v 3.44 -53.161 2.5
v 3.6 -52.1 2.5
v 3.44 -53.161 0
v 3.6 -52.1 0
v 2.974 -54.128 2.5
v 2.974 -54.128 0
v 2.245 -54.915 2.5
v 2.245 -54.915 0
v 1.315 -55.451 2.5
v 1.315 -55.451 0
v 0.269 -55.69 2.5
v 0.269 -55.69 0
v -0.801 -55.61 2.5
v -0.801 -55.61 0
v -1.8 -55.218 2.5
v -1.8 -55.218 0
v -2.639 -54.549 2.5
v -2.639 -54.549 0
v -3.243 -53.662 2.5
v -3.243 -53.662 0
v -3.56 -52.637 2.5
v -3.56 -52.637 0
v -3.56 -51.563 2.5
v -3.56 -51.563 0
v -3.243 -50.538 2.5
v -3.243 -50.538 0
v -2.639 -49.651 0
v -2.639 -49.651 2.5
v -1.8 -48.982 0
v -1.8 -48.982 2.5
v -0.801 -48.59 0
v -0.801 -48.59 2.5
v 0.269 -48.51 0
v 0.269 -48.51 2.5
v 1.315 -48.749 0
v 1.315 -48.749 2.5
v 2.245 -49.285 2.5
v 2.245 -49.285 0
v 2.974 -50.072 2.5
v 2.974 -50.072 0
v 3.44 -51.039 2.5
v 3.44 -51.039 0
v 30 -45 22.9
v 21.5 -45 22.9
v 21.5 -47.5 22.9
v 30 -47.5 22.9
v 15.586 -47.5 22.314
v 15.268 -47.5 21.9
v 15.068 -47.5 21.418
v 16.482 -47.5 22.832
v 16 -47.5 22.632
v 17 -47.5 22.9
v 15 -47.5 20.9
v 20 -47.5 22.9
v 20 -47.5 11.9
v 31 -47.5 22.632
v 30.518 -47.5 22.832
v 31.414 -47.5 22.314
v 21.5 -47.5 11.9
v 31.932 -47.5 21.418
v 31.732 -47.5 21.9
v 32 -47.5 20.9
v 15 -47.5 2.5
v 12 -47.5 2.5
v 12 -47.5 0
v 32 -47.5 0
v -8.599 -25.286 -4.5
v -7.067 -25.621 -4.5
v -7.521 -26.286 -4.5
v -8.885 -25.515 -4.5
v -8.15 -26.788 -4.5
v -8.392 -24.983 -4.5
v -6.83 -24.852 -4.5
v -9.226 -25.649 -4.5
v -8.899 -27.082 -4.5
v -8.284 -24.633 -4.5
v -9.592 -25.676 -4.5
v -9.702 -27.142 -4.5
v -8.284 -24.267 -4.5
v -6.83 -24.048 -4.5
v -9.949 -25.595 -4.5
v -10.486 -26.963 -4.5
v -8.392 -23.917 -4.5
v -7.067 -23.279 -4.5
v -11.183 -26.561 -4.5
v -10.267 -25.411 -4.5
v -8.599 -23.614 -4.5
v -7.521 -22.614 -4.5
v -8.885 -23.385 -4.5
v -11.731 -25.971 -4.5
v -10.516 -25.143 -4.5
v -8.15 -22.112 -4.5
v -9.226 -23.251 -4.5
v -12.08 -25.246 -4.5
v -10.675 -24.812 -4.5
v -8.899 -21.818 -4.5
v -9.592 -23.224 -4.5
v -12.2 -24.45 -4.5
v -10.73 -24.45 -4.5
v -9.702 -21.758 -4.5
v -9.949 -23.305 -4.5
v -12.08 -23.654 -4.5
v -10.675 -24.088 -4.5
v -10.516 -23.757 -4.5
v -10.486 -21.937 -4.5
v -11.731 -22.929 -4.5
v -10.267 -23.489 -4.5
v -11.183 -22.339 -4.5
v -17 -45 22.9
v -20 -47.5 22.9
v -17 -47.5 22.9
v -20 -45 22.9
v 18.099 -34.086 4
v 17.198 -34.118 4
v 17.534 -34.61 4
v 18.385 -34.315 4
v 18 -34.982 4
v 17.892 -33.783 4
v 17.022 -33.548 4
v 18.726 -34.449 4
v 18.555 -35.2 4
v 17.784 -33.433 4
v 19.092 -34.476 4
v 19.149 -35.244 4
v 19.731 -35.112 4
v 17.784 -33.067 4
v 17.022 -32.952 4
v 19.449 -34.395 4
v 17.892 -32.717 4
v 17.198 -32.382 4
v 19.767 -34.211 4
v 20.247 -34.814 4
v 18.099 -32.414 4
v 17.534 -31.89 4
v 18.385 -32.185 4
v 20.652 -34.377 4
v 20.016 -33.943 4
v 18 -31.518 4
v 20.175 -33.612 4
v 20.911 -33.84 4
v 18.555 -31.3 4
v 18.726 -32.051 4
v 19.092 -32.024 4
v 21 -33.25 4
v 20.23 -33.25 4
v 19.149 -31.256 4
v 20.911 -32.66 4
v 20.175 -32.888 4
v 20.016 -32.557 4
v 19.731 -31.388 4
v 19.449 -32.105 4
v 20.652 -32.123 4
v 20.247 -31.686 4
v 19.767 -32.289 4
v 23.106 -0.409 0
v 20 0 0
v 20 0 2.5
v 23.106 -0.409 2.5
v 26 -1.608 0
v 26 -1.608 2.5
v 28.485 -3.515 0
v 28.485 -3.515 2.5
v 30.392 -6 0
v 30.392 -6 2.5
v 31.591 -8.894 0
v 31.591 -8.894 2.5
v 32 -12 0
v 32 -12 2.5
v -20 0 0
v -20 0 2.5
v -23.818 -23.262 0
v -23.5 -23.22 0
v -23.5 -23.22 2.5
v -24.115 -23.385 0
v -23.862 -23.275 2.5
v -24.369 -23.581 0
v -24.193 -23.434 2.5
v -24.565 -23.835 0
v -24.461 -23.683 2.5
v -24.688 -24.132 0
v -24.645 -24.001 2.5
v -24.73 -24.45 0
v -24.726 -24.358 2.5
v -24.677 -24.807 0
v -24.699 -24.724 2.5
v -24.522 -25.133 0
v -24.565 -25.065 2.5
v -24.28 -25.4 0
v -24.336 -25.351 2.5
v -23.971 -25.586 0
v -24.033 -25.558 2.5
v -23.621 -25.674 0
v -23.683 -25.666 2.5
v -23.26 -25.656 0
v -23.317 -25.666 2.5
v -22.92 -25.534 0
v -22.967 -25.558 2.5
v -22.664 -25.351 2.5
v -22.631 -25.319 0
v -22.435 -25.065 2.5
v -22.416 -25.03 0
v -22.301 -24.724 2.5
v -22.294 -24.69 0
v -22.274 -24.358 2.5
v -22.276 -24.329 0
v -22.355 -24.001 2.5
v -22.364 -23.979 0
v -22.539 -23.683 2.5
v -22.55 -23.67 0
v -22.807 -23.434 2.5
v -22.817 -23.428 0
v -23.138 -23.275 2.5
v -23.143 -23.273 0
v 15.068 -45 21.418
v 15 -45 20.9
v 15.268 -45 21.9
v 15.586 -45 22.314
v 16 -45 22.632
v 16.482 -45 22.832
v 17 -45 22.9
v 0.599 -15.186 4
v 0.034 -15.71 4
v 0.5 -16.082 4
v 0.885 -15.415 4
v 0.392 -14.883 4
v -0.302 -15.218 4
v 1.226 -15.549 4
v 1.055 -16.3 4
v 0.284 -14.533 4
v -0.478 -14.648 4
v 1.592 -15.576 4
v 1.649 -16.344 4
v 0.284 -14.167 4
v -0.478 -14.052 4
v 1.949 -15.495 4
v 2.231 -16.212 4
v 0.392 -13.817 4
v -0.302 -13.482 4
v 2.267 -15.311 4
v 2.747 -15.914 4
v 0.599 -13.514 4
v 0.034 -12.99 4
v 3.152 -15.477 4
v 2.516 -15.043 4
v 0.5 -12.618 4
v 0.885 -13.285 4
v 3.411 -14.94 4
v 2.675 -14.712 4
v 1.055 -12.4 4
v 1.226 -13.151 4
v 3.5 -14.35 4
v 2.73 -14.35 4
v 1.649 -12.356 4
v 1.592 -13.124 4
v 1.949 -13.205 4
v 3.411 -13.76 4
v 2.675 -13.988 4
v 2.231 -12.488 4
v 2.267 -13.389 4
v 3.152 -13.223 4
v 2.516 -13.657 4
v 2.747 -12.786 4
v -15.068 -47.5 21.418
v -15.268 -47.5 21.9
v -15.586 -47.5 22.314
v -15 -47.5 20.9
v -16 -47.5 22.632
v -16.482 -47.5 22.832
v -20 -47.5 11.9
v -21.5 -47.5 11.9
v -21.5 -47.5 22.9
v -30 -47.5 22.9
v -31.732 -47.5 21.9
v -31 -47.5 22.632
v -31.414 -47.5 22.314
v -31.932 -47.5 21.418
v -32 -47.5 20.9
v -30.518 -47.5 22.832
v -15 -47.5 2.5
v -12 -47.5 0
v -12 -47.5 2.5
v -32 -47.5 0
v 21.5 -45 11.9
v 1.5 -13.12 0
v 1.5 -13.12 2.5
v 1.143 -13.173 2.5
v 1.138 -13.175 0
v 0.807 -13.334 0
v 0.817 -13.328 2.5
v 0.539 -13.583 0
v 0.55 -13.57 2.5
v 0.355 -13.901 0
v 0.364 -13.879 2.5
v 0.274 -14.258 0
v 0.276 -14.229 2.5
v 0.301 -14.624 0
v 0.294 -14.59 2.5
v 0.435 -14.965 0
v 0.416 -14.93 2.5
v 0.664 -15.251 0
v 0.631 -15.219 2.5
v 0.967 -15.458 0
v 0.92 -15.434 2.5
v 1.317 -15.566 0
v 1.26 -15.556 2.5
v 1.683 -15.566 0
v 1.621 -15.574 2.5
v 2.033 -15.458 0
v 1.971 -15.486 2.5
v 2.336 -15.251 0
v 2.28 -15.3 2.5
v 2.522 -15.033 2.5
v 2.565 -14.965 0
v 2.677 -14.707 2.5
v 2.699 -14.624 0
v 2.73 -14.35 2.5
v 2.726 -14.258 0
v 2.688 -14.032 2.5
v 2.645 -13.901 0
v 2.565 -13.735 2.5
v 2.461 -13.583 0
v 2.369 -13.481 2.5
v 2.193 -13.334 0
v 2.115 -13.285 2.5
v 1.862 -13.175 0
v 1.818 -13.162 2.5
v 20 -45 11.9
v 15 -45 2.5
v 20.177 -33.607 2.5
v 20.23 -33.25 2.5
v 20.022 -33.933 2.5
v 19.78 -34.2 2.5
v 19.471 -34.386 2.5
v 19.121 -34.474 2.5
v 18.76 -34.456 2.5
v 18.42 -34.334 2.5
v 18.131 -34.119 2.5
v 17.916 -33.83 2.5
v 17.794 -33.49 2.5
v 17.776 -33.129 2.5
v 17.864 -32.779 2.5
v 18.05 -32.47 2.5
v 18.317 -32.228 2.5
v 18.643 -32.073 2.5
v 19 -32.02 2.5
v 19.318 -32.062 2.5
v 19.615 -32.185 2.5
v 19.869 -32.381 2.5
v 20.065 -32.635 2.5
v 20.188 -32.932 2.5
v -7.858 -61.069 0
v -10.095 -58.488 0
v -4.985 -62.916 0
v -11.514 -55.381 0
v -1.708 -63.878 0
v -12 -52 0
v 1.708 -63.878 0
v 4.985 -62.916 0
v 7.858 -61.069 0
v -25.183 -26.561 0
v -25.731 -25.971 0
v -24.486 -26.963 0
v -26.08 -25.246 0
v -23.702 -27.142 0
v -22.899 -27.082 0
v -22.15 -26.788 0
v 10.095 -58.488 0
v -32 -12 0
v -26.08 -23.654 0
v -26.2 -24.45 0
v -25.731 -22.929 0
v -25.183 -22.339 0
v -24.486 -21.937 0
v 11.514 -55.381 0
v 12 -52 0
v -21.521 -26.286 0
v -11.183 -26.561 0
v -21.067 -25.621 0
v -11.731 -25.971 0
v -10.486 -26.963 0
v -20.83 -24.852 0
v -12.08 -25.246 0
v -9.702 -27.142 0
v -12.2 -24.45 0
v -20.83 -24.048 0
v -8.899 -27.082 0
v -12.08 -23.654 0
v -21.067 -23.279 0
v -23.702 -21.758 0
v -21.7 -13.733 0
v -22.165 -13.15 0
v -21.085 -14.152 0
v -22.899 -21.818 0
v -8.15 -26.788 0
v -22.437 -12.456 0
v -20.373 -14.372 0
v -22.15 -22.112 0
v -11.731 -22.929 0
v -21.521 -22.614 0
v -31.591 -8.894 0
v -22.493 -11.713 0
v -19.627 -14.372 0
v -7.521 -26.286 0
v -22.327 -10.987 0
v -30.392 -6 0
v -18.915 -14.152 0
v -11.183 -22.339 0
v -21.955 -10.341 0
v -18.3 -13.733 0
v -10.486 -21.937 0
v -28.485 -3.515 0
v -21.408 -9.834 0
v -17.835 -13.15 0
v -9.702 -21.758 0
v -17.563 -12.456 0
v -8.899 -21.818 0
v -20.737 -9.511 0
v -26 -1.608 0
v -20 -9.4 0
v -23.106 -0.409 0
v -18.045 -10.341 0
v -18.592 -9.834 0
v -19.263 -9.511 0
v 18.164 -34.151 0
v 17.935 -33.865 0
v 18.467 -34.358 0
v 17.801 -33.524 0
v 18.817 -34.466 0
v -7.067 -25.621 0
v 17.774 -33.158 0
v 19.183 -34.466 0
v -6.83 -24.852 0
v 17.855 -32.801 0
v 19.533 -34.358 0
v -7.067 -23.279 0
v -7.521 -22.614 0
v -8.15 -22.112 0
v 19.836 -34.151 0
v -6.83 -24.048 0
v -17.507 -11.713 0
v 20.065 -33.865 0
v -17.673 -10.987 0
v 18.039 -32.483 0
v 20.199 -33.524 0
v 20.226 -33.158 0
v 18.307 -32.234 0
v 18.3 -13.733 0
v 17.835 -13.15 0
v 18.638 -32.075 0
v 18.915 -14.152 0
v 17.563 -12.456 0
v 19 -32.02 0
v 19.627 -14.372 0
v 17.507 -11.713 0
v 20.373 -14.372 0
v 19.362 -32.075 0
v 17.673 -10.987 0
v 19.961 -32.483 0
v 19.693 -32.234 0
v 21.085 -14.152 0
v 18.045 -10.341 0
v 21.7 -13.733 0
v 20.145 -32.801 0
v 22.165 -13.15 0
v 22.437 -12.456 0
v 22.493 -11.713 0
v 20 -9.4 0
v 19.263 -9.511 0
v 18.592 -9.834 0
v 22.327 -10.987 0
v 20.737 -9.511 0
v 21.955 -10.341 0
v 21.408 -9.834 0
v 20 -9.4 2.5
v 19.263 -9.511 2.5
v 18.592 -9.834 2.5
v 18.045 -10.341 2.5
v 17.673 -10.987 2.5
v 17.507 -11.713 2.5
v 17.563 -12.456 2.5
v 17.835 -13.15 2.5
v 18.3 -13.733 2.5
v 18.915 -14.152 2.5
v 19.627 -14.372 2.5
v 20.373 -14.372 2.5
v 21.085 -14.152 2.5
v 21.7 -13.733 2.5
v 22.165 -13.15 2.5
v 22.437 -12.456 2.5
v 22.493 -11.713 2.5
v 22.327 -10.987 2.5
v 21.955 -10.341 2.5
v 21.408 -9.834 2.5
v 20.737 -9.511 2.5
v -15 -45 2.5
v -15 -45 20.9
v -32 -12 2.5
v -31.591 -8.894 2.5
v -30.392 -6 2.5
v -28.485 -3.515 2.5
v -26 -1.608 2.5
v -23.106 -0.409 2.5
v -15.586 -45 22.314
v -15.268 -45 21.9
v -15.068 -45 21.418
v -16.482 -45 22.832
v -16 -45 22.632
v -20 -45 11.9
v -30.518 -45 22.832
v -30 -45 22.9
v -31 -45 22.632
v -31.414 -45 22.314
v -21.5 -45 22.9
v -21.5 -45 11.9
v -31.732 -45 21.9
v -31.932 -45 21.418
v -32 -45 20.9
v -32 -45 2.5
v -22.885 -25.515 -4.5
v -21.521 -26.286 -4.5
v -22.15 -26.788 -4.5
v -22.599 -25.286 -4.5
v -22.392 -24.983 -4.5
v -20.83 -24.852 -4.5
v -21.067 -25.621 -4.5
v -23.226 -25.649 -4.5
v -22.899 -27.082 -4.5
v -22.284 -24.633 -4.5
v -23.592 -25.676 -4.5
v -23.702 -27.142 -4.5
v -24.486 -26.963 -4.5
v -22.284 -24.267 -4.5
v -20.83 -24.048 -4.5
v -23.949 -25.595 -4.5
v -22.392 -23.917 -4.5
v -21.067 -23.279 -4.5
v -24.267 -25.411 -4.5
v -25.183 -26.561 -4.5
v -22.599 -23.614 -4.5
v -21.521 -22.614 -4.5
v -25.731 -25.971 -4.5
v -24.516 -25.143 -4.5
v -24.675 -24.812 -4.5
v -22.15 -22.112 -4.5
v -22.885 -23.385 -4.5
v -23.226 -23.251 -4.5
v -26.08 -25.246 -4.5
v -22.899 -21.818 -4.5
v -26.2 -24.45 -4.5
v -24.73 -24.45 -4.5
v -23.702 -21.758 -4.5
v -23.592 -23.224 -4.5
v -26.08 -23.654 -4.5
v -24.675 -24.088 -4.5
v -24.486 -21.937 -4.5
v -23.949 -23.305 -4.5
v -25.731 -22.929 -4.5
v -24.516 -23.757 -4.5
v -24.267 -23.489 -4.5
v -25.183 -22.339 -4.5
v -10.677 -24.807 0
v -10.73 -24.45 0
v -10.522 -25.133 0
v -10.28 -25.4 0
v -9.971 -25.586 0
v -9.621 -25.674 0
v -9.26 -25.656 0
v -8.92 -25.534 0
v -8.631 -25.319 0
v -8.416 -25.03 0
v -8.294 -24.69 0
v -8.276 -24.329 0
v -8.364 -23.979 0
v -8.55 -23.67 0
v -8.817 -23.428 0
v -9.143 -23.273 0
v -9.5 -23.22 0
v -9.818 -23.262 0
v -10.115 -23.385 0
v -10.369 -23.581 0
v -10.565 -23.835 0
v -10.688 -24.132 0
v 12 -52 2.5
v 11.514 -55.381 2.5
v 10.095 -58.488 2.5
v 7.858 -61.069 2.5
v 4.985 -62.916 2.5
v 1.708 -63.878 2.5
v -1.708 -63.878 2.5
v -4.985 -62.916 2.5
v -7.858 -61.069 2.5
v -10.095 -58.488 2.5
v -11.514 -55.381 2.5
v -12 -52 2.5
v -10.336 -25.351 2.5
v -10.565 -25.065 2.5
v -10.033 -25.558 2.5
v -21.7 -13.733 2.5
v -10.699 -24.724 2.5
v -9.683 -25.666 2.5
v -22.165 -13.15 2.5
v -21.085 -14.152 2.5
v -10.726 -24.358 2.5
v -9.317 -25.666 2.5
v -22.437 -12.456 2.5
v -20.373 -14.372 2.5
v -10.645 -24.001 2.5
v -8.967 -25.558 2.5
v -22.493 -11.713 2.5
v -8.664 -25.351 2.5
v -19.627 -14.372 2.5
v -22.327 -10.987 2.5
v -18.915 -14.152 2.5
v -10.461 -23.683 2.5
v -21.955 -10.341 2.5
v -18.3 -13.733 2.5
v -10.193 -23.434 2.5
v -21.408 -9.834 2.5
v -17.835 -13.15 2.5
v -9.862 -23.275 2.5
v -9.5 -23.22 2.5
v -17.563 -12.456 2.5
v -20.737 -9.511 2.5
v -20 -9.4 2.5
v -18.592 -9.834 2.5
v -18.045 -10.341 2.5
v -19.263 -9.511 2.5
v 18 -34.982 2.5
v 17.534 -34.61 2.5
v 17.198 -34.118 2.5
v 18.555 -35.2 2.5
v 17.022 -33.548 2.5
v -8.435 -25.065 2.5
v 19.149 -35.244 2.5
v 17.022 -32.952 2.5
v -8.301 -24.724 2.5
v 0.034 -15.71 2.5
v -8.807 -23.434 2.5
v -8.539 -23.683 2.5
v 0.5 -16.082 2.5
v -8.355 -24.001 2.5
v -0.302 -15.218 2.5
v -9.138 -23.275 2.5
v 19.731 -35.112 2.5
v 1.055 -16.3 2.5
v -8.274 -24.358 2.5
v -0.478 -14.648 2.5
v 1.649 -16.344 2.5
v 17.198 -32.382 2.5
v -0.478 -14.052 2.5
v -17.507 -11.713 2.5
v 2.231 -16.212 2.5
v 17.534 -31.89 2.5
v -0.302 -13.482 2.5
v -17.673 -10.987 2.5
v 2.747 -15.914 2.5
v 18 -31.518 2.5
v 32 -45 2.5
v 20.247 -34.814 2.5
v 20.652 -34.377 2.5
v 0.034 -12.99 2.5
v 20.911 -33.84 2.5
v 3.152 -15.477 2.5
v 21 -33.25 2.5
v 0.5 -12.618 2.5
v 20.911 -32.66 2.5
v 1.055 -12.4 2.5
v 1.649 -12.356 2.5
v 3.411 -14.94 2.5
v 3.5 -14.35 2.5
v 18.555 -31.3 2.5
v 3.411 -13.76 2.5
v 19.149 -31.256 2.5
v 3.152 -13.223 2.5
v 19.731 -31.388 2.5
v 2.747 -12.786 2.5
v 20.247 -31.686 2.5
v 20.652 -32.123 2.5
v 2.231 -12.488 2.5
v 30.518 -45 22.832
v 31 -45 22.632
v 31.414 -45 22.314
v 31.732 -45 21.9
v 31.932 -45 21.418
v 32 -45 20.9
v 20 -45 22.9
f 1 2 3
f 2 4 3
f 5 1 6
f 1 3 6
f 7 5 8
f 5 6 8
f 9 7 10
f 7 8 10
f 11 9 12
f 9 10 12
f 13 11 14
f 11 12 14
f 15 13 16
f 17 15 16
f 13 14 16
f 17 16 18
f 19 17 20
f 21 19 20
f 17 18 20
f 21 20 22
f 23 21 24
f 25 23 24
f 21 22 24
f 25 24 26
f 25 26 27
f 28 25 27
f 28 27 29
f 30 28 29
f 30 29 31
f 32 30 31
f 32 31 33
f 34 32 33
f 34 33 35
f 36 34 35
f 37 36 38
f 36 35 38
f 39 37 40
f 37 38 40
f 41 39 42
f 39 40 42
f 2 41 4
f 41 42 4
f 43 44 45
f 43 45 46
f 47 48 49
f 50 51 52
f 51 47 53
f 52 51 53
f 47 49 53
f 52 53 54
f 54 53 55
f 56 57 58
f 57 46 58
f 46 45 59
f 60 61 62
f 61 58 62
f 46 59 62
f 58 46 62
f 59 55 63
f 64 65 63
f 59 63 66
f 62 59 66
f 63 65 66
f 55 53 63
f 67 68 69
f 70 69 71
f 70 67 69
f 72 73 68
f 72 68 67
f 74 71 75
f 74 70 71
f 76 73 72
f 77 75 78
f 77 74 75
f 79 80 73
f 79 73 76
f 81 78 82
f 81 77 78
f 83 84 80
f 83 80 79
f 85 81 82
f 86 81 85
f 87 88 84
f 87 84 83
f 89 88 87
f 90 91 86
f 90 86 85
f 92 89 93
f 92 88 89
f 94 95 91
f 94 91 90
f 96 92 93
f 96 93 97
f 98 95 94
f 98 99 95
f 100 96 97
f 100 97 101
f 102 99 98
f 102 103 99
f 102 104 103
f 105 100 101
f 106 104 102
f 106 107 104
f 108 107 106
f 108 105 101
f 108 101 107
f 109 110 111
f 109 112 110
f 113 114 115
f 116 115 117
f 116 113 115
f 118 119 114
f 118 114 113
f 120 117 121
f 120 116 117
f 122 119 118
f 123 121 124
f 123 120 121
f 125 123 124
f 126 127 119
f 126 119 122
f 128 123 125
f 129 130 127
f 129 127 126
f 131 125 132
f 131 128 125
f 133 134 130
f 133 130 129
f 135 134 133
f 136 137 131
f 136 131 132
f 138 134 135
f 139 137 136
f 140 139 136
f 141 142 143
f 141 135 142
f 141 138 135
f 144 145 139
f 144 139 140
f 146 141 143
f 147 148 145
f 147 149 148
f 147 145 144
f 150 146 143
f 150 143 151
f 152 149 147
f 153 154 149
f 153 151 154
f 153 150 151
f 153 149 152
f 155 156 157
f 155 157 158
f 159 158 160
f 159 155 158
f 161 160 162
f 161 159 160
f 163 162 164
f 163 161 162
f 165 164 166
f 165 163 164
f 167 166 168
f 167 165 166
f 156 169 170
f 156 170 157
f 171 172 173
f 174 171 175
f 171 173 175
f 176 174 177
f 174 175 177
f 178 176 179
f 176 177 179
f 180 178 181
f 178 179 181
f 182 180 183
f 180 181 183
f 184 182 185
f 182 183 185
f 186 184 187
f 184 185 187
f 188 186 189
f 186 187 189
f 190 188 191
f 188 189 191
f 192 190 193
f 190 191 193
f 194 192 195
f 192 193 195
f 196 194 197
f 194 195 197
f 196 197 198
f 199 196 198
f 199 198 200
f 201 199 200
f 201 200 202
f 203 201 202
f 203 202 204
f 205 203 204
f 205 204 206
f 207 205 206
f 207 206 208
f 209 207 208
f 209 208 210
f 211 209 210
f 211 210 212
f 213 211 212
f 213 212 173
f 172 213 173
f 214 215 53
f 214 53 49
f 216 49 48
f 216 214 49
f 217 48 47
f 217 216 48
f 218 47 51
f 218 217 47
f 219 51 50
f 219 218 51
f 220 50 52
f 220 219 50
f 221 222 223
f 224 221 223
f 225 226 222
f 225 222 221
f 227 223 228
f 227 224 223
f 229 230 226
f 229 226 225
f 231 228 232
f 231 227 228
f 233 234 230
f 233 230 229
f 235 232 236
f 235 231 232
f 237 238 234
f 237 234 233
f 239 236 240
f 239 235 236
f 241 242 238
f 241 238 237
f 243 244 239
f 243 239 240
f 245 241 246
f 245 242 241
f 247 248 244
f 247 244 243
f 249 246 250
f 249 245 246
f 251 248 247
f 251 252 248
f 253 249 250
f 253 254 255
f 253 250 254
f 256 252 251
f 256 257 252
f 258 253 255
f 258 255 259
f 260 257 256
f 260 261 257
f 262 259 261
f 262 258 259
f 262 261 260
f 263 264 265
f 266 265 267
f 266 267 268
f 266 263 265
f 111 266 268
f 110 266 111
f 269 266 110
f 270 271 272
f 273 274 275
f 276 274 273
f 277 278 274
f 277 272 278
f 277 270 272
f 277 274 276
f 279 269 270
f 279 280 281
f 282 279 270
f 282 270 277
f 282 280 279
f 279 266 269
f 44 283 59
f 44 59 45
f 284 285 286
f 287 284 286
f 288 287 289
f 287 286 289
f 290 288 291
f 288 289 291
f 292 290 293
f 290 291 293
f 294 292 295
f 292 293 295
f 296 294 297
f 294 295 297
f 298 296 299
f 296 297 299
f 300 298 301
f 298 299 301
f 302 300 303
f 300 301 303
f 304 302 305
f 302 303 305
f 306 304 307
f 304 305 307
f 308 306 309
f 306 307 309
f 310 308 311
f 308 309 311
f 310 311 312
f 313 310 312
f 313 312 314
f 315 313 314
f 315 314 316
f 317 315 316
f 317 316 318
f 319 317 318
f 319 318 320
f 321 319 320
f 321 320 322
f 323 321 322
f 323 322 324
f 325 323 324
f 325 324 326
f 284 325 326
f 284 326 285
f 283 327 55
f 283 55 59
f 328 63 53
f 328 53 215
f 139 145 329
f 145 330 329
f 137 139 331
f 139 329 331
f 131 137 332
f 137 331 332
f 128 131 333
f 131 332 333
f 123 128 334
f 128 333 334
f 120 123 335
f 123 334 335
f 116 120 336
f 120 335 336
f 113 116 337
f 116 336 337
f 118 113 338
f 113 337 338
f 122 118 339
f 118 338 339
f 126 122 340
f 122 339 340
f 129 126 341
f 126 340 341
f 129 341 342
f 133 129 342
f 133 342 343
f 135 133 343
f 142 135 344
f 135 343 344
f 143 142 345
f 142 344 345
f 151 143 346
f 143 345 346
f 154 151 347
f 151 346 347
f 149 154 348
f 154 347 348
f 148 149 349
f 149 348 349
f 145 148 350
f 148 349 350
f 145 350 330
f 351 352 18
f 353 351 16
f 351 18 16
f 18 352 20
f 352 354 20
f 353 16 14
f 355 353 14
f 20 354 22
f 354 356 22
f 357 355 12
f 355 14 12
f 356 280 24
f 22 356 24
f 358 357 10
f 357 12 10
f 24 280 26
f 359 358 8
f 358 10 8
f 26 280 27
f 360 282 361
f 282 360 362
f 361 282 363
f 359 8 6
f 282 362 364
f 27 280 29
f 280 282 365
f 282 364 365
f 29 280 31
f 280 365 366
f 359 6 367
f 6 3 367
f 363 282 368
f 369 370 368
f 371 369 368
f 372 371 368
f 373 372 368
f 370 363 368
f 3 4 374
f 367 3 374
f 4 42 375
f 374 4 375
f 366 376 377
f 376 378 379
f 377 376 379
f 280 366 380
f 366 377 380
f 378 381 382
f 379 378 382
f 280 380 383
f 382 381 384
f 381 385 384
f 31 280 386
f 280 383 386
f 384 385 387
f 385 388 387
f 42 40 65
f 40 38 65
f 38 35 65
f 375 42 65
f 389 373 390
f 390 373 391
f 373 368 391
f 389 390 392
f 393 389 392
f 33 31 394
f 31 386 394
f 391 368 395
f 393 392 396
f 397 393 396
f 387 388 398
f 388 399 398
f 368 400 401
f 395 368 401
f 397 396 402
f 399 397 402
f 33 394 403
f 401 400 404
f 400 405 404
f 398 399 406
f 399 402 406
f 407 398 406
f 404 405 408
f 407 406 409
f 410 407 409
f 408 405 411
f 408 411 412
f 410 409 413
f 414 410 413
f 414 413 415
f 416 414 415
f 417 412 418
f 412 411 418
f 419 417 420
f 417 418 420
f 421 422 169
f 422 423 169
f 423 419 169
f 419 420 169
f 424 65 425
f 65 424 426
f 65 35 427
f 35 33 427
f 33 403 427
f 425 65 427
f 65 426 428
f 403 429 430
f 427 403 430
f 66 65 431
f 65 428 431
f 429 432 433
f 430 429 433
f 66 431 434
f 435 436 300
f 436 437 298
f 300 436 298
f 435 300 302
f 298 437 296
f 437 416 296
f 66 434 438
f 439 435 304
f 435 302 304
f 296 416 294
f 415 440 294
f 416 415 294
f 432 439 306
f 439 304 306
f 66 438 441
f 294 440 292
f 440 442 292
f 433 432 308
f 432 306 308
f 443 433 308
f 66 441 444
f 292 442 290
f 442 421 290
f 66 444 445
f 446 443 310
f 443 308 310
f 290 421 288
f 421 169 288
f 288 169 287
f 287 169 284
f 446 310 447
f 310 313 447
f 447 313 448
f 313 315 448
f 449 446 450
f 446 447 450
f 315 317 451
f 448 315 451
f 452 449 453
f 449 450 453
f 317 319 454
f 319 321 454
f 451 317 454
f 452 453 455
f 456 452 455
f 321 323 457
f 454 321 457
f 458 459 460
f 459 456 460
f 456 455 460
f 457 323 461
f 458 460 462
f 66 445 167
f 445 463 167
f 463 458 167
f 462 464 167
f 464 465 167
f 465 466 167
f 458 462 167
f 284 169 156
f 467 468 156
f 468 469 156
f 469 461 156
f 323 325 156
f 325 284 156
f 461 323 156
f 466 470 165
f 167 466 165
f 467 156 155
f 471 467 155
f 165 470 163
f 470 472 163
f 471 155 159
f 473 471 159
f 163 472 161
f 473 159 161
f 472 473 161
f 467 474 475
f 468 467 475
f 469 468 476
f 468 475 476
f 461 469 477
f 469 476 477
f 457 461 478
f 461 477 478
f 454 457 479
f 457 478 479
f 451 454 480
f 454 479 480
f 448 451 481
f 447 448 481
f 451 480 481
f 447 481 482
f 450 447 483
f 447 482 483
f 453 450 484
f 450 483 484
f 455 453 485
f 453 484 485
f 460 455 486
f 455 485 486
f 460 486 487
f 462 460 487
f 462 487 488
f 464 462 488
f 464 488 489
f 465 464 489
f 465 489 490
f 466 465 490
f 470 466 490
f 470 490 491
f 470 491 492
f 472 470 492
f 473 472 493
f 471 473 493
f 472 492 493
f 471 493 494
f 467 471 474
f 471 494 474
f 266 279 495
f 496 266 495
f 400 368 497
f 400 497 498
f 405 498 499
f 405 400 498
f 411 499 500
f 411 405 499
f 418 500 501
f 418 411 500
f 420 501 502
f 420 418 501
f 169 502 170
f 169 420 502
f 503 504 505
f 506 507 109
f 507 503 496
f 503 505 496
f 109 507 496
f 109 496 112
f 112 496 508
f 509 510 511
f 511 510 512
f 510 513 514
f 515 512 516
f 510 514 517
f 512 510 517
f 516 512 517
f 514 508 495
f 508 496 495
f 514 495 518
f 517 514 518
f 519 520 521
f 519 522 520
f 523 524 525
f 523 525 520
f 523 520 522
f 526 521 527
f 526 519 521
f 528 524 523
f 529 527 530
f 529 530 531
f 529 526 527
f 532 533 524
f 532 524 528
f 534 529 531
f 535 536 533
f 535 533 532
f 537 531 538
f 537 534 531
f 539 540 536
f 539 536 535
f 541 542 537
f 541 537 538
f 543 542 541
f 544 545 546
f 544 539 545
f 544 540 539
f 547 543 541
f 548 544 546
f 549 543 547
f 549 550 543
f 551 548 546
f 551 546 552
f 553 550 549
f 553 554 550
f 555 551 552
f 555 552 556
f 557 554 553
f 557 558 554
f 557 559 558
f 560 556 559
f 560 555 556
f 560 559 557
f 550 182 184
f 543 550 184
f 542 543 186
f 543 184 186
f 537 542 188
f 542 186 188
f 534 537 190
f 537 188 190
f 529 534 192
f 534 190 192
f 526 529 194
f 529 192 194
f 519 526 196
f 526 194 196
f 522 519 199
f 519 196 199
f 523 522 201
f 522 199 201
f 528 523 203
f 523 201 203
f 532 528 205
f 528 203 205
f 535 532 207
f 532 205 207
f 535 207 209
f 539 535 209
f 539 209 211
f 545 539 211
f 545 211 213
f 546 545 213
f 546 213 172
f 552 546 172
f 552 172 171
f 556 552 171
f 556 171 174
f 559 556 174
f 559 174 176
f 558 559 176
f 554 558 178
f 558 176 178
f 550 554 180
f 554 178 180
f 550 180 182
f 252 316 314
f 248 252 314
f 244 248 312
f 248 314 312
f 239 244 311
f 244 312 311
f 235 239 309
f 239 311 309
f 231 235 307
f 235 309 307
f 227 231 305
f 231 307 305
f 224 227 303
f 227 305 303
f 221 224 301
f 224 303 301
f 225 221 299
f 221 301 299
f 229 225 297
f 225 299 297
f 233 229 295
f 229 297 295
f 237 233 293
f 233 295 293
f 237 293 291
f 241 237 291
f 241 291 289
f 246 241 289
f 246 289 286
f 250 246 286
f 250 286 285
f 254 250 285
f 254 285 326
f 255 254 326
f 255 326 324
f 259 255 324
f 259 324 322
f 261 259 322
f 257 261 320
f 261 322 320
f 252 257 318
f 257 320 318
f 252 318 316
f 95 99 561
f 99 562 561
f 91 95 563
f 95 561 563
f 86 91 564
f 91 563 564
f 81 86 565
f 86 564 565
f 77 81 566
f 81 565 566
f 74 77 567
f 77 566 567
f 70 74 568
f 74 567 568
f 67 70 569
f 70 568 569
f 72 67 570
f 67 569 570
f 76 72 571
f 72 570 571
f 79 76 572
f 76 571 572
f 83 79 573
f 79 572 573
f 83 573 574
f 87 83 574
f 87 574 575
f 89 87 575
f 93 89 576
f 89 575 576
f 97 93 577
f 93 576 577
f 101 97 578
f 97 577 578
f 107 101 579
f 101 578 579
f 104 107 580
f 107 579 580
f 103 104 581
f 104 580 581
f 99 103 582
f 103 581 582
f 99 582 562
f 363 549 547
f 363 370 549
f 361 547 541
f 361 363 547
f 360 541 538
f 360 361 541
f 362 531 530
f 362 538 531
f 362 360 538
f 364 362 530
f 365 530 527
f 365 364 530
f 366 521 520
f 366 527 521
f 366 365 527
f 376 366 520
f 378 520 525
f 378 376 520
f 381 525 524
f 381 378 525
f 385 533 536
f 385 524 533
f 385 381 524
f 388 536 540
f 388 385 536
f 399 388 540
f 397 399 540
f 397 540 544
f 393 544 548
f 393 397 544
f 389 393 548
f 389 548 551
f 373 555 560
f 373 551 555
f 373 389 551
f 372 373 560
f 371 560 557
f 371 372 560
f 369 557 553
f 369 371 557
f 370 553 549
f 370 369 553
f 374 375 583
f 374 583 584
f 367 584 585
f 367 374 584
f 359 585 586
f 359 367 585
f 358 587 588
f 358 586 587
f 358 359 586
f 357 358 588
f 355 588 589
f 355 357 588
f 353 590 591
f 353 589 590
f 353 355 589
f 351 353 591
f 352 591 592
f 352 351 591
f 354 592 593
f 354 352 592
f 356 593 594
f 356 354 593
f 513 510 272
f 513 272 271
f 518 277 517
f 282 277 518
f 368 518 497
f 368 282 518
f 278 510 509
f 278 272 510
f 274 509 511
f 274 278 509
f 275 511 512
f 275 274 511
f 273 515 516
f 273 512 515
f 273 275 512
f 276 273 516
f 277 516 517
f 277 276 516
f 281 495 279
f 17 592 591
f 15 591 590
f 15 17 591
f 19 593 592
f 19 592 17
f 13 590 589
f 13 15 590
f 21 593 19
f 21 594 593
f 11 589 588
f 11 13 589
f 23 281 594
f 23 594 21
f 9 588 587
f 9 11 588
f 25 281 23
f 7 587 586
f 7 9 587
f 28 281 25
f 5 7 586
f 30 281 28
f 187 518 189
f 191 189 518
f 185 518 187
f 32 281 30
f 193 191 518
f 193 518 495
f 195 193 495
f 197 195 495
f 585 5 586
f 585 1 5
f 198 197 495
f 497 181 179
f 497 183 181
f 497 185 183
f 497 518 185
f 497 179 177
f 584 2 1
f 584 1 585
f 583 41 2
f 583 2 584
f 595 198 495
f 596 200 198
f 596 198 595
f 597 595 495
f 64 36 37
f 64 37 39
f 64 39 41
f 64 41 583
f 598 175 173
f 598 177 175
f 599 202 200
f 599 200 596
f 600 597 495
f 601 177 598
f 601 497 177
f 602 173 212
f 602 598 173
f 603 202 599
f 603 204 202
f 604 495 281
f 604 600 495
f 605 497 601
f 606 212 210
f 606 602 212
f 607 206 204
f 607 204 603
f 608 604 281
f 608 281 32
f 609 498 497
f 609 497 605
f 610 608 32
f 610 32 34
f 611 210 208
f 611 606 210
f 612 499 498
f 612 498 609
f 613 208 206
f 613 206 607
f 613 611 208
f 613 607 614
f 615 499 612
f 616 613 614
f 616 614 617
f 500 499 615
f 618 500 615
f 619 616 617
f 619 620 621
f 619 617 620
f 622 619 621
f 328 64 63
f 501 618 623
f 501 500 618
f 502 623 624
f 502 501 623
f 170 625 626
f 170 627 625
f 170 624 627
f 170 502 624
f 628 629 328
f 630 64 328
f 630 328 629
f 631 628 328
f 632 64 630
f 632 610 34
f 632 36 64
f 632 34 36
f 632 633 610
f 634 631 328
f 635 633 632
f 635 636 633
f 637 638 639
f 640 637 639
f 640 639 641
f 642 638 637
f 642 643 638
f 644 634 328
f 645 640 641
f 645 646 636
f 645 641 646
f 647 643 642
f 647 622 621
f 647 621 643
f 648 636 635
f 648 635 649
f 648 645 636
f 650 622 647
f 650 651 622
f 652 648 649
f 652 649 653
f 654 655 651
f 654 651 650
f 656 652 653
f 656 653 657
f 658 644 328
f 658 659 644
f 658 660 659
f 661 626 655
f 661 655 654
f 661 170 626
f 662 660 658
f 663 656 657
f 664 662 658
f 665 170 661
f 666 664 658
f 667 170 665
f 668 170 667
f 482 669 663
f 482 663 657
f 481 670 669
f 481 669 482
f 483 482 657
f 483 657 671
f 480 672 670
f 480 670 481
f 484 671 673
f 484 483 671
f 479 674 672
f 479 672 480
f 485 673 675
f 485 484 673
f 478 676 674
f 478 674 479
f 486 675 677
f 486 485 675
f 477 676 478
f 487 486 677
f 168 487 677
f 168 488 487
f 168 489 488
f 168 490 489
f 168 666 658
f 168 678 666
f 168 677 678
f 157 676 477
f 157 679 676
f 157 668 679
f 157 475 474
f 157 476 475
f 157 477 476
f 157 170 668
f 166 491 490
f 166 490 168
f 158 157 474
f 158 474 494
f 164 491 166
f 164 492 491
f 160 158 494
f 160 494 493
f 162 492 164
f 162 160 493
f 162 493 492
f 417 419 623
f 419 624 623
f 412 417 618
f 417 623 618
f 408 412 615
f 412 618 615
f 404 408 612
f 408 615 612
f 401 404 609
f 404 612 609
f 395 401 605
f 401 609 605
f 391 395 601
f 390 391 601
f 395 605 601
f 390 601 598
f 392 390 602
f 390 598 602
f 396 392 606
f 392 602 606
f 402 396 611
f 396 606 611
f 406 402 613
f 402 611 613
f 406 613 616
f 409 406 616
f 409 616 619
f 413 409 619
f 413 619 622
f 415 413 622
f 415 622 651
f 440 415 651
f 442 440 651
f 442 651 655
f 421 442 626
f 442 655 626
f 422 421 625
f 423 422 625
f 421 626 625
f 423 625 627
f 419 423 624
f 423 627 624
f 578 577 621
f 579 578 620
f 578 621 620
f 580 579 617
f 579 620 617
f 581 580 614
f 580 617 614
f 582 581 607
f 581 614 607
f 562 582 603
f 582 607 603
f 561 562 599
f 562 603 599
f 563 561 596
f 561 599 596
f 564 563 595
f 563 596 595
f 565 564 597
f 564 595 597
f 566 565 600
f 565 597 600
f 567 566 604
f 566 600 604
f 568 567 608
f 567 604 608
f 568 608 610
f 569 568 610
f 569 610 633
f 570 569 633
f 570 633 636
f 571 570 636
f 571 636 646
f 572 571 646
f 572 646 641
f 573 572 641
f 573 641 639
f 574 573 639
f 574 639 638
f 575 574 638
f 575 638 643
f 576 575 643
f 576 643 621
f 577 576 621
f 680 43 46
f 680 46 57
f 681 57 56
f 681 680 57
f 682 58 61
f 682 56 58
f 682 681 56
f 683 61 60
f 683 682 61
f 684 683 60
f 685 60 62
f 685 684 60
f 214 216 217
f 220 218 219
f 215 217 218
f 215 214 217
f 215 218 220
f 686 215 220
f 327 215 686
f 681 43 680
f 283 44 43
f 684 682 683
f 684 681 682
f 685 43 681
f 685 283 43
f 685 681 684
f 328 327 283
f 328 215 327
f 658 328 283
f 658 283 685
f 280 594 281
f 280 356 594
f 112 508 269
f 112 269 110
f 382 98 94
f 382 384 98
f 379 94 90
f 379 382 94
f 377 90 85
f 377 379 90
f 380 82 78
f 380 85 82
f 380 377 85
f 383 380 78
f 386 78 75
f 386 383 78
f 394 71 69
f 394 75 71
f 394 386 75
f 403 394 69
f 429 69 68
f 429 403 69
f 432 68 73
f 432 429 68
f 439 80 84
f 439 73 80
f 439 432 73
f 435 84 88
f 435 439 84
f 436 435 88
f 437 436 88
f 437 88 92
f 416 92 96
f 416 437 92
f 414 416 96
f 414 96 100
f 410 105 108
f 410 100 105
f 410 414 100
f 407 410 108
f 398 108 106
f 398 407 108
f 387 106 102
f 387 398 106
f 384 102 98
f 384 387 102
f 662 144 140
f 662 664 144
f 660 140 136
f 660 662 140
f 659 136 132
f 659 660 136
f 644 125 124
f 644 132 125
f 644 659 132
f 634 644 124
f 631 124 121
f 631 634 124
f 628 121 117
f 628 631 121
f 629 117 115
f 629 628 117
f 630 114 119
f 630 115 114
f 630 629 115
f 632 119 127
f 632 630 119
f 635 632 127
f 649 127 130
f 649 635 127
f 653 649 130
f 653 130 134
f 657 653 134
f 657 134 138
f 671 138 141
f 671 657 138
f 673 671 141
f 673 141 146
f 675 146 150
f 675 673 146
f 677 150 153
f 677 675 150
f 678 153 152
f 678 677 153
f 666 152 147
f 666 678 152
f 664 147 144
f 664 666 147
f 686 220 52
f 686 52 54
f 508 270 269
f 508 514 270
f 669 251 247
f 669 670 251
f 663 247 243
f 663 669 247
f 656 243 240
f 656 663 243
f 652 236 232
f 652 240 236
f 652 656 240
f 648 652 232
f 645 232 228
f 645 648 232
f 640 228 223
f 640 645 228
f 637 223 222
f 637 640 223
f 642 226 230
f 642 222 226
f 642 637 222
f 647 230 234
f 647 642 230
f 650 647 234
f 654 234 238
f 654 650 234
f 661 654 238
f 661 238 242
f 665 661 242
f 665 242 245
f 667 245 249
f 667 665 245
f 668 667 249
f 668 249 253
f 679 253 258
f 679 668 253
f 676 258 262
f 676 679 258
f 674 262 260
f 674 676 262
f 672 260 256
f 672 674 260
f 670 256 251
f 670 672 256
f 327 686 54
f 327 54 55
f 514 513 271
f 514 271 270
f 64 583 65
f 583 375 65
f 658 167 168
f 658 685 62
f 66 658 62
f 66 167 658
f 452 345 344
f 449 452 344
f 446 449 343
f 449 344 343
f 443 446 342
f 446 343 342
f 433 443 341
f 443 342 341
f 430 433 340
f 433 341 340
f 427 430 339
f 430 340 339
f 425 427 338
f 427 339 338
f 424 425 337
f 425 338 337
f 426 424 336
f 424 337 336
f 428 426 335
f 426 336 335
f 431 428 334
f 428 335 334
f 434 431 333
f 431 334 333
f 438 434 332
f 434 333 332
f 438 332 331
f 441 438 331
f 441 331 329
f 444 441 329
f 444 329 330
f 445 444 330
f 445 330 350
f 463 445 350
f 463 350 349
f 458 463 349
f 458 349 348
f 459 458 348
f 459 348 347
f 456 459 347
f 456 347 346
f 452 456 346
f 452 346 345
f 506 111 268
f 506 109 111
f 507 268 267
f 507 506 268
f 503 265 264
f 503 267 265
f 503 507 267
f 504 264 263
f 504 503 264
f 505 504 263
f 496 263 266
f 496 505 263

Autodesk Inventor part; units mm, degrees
ref_plane "YZ Plane" through (0, 0, 0) normal (1, 0, 0) x (0, 1, 0)
ref_plane "XZ Plane" through (0, 0, 0) normal (0, 1, 0) x (-1, 0, 0)
ref_plane "XY Plane" through (0, 0, 0) normal (0, 0, 1) x (1, 0, 0)
sketch "Sketch1" plane through (0, 0, 0) normal (0, 0, 1) x (1, 0, 0)
  line L0 (-20, 0) -> (20, 0)
  line L1 (32, -12) -> (32, -47.5)
  line L2 (0, -64) -> (0, -64)
  line L3 (-32, -47.5) -> (-32, -12)
  arc A0 (-20, 0) -> (-32, -12) centre (-20, -12) ccw
  arc A1 (32, -12) -> (20, 0) centre (20, -12) ccw
  line L4 (-12, -52) -> (-12, -47.5)
  line L5 (-12, -47.5) -> (-32, -47.5)
  line L6 (12, -52) -> (12, -47.5)
  line L7 (12, -47.5) -> (32, -47.5)
  circle A2 centre (0, -52.1) radius 3.6
  line L8 (0, -80.2794) -> (0, 16.2794) projected
  arc A3 (-12, -52) -> (0, -64) centre (0, -52) ccw
  arc A4 (0, -64) -> (12, -52) centre (0, -52) ccw
  point P0 (0, 0)
  point P1 (0, 0)
  point P2 (0, -64)
  dimension "d0" = 64
  dimension "d1" = 64
  dimension "d2" = 12
  dimension "d3" = 47.5
  dimension "d4" = 47.5
  dimension "d5" = 7.2
  dimension "d6" = 52.1
  dimension "d8" = 12
  dimension "d9" = 12
  dimension "d10" = 12
extrude "Extrusion1" add sketch "Sketch1" along normal blind 2.5 contours L0 L8 A2 A3 L4 L5 L3 A0 | L0 A1 L1 L7 L6 A4 L8 A2
sketch "Sketch2" plane through (0, 0, 2.5) normal (0, 0, 1) x (1, 0, 0)
  line L0 (-32, -47.5) -> (-15, -47.5)
  line L1 (-15, -47.5) -> (-15, -45)
  line L2 (-15, -45) -> (-32, -45)
  line L3 (-32, -45) -> (-32, -47.5)
  line L4 (32, -47.5) -> (32, -12) projected
  line L5 (32, -47.5) -> (15, -47.5)
  line L6 (15, -47.5) -> (15, -45)
  line L7 (15, -45) -> (32, -45)
  line L8 (32, -45) -> (32, -47.5)
  point P0 (0, 0)
  point P1 (-12, -47.5)
  point P2 (12, -47.5)
  point P3 (32, -45)
  point P4 (15, -46.25)
  point P5 (-15, -46.25)
  dimension "d13" = 2.5
  dimension "d17" = 30
  dimension "d18" = 2.5
extrude "Extrusion2" add sketch "Sketch2" along normal blind 20.4
sketch "Sketch3" plane through (15, -45, 2.5) normal (0, 1, 0) x (1, 0, 0)
  line L0 (0, -20.4) -> (17, -20.4) projected
  line L1 (6.5, -20.4) -> (5, -20.4)
  line L2 (5, -20.4) -> (5, -9.4)
  line L3 (5, -9.4) -> (6.5, -9.4)
  line L4 (6.5, -9.4) -> (6.5, -20.4)
  line L5 (-3, 2.5) -> (17, 2.5) projected
  line L6 (-30, -20.4) -> (-47, -20.4) projected
  line L7 (-35, -20.4) -> (-36.5, -20.4)
  line L8 (-36.5, -20.4) -> (-36.5, -9.4)
  line L9 (-36.5, -9.4) -> (-35, -9.4)
  line L10 (-35, -9.4) -> (-35, -20.4)
  line L11 (-47, 2.5) -> (-27, 2.5) projected
  line L12 (0, 0) -> (0, -20.4) projected
  point P0 (-15, 2.5)
  point P1 (5, -14.9)
  point P2 (5, -20.4)
  dimension "d19" = 1.5
  dimension "d20" = 11.9
  dimension "d21" = 1.5
  dimension "d22" = 11.9
  dimension "d23" = 40
  dimension "d24" = 5
extrude "Extrusion3" cut sketch "Sketch3" against normal through all
fillet "Fillet1" radius 2 4 edges at (32, -46.25, 22.9) (15, -46.25, 22.9) (-15, -46.25, 22.9) (-32, -46.25, 22.9)
sketch "Sketch4" plane through (0, 0, 0) normal (0, 0, -1) x (-1, 0, 0)
  line L0 (-20, 0) -> (20, 0) projected
  line L1 (-32, -47.5) -> (-32, -12) projected
  line L2 (0, -76.8) -> (0, 12.8) projected
  point P0 (0, 0)
  point P1 (-20, -11.9)
  point P2 (20, -11.9)
  dimension "d28" = 11.9
  dimension "d30" = 20
  dimension "d31" = 20
hole "Hole1" at (20, -11.9, 0) at (-20, -11.9, 0) direction (0, 0, 1) diameter 5 end through all
sketch "Sketch5" plane through (0, 0, 0) normal (0, 0, -1) x (-1, 0, 0)
  line L0 (0, -76.8) -> (0, 12.8) projected
  line L1 (-20, 0) -> (20, 0) projected
  point P0 (0, 0)
  point P1 (-19, -33.25)
  point P2 (-1.5, -14.35)
  dimension "d39" = 19
  dimension "d40" = 33.25
  dimension "d41" = 1.5
  dimension "d42" = 14.35
hole "Hole2" at (19, -33.25, 0) at (1.5, -14.35, 0) direction (0, 0, 1) diameter 2.459 end through all thread size "M3x0.5" class "6H" standard "ISO Metric profile"
sketch "Sketch6" plane through (0, 0, 0) normal (0, 0, -1) x (-1, 0, 0)
  line L0 (-20, 0) -> (20, 0) projected
  line L1 (0, -76.8) -> (0, 12.8) projected
  point P0 (0, 0)
  point P1 (9.5, -24.45)
  point P2 (23.5, -24.45)
  dimension "d50" = 24.45
  dimension "d51" = 9.5
  dimension "d52" = 23.5
hole "Hole3" at (-9.5, -24.45, 0) at (-23.5, -24.45, 0) direction (0, 0, 1) diameter 2.459 end through all thread size "M3x0.5" class "6H" standard "ISO Metric profile"
sketch "Sketch7" plane through (0, 0, 0) normal (0, 0, -1) x (-1, 0, 0)
  circle A0 centre (9.5, -24.45) radius 1.2295 projected
  circle A1 centre (9.5, -24.45) radius 2.7
  circle A2 centre (23.5, -24.45) radius 1.2295 projected
  circle A3 centre (23.5, -24.45) radius 2.7
  point P0 (0, 0)
  dimension "d60" = 5.4
  dimension "d61" = 5.4
extrude "Extrusion4" add sketch "Sketch7" along normal blind 4.5
sketch "Sketch8" plane through (0, 0, 2.5) normal (0, 0, 1) x (1, 0, 0)
  circle A0 centre (1.5, -14.35) radius 1.2295 projected
  circle A1 centre (1.5, -14.35) radius 2
  circle A2 centre (19, -33.25) radius 1.2295 projected
  circle A3 centre (19, -33.25) radius 2
  point P0 (0, 0)
  dimension "d64" = 4
  dimension "d65" = 4
extrude "Extrusion5" add sketch "Sketch8" along normal blind 1.5
properties part number "Extruder Plate" material "Aluminum 6061"
